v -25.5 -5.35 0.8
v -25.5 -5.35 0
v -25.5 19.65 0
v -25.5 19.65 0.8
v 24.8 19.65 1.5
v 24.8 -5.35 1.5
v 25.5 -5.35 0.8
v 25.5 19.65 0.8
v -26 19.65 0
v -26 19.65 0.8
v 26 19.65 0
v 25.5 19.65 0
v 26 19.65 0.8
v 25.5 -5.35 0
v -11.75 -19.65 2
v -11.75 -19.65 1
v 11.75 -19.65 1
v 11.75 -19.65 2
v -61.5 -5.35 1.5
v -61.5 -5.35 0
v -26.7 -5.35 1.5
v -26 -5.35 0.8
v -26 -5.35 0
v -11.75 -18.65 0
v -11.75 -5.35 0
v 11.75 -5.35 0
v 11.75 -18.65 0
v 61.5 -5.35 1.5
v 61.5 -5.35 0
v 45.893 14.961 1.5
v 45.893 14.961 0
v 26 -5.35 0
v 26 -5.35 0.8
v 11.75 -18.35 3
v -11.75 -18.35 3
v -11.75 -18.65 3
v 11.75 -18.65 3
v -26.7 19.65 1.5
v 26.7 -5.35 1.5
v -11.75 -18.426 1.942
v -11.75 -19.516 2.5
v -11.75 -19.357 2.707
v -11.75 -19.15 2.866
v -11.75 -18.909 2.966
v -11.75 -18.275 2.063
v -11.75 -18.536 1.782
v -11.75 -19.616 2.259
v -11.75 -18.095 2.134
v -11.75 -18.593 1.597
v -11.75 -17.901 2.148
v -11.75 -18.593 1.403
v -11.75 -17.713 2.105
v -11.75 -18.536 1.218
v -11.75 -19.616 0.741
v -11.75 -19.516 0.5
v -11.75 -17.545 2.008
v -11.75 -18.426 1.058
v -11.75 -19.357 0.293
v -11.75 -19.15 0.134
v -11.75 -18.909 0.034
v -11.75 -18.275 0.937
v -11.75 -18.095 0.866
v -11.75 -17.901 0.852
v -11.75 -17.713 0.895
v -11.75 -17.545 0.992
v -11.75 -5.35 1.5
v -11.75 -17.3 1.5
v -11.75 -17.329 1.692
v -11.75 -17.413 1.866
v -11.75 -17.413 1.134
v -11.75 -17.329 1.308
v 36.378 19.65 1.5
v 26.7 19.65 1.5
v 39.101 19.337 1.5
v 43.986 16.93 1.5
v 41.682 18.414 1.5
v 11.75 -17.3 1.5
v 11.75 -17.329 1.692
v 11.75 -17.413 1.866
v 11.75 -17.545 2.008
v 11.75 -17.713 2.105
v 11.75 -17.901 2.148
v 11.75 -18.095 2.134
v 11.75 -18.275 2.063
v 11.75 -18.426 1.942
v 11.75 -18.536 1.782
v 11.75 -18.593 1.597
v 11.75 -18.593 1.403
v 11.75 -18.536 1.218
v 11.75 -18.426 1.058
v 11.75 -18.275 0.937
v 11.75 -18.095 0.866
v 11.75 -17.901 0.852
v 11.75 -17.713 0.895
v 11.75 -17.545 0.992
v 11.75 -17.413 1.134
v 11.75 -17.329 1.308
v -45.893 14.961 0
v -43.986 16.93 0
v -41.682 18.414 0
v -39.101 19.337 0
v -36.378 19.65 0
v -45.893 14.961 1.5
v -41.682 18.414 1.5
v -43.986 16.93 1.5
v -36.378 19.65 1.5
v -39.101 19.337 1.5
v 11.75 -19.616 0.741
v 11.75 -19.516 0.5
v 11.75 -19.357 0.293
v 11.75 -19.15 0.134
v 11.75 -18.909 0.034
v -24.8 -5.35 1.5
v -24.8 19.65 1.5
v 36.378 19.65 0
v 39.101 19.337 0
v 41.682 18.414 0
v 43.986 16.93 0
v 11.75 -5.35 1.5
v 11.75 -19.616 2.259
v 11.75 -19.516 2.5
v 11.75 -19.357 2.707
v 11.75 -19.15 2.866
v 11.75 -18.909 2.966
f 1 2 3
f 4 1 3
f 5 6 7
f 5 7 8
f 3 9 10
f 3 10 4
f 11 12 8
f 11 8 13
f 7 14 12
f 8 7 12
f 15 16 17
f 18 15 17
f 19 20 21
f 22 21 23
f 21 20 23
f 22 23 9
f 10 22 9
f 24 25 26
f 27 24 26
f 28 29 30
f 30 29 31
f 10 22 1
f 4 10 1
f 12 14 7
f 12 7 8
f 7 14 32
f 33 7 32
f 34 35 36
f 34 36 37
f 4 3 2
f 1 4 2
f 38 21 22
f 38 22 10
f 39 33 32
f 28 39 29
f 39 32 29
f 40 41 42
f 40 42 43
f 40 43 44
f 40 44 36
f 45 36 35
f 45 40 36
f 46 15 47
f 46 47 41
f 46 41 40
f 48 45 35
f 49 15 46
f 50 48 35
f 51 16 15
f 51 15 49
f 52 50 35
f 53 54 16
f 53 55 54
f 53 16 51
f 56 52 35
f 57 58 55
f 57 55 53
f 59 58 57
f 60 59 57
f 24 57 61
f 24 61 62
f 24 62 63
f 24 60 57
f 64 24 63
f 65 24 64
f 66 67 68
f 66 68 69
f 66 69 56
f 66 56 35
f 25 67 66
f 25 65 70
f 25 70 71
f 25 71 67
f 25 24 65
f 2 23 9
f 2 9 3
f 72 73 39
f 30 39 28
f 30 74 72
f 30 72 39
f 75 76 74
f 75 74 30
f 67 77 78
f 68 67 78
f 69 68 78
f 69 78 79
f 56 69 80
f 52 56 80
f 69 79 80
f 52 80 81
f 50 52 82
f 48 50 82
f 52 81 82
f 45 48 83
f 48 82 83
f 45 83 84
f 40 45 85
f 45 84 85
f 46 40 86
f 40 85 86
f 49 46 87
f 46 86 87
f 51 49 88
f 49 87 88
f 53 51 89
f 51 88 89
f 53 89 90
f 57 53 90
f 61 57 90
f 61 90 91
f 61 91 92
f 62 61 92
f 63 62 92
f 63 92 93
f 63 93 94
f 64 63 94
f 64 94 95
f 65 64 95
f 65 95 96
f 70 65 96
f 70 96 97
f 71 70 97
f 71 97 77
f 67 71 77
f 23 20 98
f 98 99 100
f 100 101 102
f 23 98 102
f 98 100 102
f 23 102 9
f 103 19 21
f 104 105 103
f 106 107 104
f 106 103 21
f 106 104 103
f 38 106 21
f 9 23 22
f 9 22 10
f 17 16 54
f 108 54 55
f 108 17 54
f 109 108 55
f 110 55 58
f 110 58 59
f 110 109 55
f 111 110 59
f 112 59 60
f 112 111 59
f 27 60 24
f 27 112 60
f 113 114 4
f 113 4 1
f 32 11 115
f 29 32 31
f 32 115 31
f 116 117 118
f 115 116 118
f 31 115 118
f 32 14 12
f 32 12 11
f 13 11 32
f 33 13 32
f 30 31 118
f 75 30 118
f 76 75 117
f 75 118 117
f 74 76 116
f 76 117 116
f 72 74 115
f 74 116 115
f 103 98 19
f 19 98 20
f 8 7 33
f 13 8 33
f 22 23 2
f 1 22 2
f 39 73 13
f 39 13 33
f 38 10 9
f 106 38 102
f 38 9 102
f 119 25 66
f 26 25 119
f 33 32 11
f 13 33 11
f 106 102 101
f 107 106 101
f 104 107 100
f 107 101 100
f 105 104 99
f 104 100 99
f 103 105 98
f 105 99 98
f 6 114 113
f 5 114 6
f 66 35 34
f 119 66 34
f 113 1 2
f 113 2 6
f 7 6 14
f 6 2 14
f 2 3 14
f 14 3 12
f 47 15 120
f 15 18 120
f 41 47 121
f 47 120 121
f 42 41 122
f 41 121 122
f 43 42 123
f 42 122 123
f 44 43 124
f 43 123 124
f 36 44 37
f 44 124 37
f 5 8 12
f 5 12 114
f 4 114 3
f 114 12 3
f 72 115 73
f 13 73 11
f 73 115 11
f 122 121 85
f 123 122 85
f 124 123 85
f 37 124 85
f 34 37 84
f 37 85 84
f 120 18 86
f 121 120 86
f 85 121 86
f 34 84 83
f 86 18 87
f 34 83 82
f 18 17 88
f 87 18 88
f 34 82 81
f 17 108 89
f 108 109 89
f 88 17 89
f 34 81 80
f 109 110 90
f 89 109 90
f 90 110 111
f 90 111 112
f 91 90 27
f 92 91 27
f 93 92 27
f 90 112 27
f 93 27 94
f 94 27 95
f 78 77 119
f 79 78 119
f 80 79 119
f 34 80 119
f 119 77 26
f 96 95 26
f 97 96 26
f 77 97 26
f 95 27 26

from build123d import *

# Parameters (mm, degrees)
F0_W      = 23.5
F0_H      = 14.3
F1_DEPTH  = 3
F2_R      = 0.65
F3_DEPTH  = 25
F4_R      = 1
F5_DEPTH  = 1.5
F0_W_2    = 0.5
F0_H_2    = 25
F6_DEPTH  = 0.8
F7_DEPTH  = 1.5
F8_SIZE   = 0.7
F8_2_SIZE = 0.7
F8_3_SIZE = 0.7
F9_SIZE2  = 13
F9_SIZE   = 1.5


with BuildPart() as f1:
    # F0 (on Top) → F1 (new body)
    with BuildSketch(Plane.XY):
        with Locations((0, -12.5)):
            Rectangle(F0_W, F0_H)
    extrude(amount=F1_DEPTH)

    # F2 (on face) → F3 (cut)
    with BuildSketch(Plane.YZ.offset(11.75)):
        with Locations((-17.95, 1.5)):
            Circle(F2_R)
    extrude(amount=-F3_DEPTH, mode=Mode.SUBTRACT)

    # F4
    f4_edges = [f1.edges().sort_by_distance(p)[0] for p in [
        (0, -19.65, 3),
        (0, -19.65, 0),
    ]]
    fillet(f4_edges, radius=F4_R)

    # F9
    f9_edges = [f1.edges().sort_by_distance(p)[0] for p in [
        (0, -5.35, 3),
    ]]
    f9_side = f1.faces().sort_by_distance((0, -5.35, 1.5))[0]
    chamfer(f9_edges, length=F9_SIZE, length2=F9_SIZE2, reference=f9_side)


with BuildPart() as f5:
    # F0 (on Top) → F5 (new body)
    with BuildSketch(Plane.XY):
        with BuildLine():
            Line((-61.5, -5.35), (-26, -5.35))
            Line((-26, -5.35), (-26, 19.65))
            Line((-26, 19.65), (-36.378023244, 19.65))
            ThreePointArc((-36.378023244, 19.65), (-41.6819771329, 18.4142033214), (-45.8934962553, 14.961345524))
            Line((-45.8934962553, 14.961345524), (-61.5, -5.35))
        make_face()
    extrude(amount=F5_DEPTH)

    # F8#2
    f8_2_edges = [f5.edges().sort_by_distance(p)[0] for p in [
        (-26, 7.15, 1.5),
    ]]
    chamfer(f8_2_edges, length=F8_2_SIZE)


with BuildPart() as f5b:
    # F0 (on Top) → F5, piece 2 (new body)
    with BuildSketch(Plane.XY):
        with BuildLine():
            Line((26, 19.65), (26, -5.35))
            Line((26, -5.35), (61.5, -5.35))
            Line((61.5, -5.35), (45.8934962553, 14.961345524))
            ThreePointArc((45.8934962553, 14.961345524), (41.6819771329, 18.4142033214), (36.378023244, 19.65))
            Line((36.378023244, 19.65), (26, 19.65))
        make_face()
    extrude(amount=F5_DEPTH)

    # F8#3
    f8_3_edges = [f5b.edges().sort_by_distance(p)[0] for p in [
        (26, 7.15, 1.5),
    ]]
    chamfer(f8_3_edges, length=F8_3_SIZE)


with BuildPart() as f6:
    # F0 (on Top) → F6 (new body)
    with BuildSketch(Plane.XY):
        with Locations((-25.75, 7.15)):
            Rectangle(F0_W_2, F0_H_2)
    extrude(amount=F6_DEPTH)


with BuildPart() as f6b:
    # F0 (on Top) → F6, piece 2 (new body)
    with BuildSketch(Plane.XY):
        with Locations((25.75, 7.15)):
            Rectangle(F0_W_2, F0_H_2)
    extrude(amount=F6_DEPTH)


with BuildPart() as f7:
    # F0 (on Top) → F7 (new body)
    with BuildSketch(Plane.XY):
        Polygon((-25.5, -5.35), (-11.75, -5.35), (11.75, -5.35), (25.5, -5.35), (25.5, 19.65), (11.75, 19.65), (-11.75, 19.65), (-25.5, 19.65), align=None)
    extrude(amount=F7_DEPTH)

    # F8
    f8_edges = [f7.edges().sort_by_distance(p)[0] for p in [
        (-25.5, 7.15, 1.5),
        (25.5, 7.15, 1.5),
    ]]
    chamfer(f8_edges, length=F8_SIZE)


solid = Compound([f1.part, f5.part, f5b.part, f6.part, f6b.part, f7.part])
